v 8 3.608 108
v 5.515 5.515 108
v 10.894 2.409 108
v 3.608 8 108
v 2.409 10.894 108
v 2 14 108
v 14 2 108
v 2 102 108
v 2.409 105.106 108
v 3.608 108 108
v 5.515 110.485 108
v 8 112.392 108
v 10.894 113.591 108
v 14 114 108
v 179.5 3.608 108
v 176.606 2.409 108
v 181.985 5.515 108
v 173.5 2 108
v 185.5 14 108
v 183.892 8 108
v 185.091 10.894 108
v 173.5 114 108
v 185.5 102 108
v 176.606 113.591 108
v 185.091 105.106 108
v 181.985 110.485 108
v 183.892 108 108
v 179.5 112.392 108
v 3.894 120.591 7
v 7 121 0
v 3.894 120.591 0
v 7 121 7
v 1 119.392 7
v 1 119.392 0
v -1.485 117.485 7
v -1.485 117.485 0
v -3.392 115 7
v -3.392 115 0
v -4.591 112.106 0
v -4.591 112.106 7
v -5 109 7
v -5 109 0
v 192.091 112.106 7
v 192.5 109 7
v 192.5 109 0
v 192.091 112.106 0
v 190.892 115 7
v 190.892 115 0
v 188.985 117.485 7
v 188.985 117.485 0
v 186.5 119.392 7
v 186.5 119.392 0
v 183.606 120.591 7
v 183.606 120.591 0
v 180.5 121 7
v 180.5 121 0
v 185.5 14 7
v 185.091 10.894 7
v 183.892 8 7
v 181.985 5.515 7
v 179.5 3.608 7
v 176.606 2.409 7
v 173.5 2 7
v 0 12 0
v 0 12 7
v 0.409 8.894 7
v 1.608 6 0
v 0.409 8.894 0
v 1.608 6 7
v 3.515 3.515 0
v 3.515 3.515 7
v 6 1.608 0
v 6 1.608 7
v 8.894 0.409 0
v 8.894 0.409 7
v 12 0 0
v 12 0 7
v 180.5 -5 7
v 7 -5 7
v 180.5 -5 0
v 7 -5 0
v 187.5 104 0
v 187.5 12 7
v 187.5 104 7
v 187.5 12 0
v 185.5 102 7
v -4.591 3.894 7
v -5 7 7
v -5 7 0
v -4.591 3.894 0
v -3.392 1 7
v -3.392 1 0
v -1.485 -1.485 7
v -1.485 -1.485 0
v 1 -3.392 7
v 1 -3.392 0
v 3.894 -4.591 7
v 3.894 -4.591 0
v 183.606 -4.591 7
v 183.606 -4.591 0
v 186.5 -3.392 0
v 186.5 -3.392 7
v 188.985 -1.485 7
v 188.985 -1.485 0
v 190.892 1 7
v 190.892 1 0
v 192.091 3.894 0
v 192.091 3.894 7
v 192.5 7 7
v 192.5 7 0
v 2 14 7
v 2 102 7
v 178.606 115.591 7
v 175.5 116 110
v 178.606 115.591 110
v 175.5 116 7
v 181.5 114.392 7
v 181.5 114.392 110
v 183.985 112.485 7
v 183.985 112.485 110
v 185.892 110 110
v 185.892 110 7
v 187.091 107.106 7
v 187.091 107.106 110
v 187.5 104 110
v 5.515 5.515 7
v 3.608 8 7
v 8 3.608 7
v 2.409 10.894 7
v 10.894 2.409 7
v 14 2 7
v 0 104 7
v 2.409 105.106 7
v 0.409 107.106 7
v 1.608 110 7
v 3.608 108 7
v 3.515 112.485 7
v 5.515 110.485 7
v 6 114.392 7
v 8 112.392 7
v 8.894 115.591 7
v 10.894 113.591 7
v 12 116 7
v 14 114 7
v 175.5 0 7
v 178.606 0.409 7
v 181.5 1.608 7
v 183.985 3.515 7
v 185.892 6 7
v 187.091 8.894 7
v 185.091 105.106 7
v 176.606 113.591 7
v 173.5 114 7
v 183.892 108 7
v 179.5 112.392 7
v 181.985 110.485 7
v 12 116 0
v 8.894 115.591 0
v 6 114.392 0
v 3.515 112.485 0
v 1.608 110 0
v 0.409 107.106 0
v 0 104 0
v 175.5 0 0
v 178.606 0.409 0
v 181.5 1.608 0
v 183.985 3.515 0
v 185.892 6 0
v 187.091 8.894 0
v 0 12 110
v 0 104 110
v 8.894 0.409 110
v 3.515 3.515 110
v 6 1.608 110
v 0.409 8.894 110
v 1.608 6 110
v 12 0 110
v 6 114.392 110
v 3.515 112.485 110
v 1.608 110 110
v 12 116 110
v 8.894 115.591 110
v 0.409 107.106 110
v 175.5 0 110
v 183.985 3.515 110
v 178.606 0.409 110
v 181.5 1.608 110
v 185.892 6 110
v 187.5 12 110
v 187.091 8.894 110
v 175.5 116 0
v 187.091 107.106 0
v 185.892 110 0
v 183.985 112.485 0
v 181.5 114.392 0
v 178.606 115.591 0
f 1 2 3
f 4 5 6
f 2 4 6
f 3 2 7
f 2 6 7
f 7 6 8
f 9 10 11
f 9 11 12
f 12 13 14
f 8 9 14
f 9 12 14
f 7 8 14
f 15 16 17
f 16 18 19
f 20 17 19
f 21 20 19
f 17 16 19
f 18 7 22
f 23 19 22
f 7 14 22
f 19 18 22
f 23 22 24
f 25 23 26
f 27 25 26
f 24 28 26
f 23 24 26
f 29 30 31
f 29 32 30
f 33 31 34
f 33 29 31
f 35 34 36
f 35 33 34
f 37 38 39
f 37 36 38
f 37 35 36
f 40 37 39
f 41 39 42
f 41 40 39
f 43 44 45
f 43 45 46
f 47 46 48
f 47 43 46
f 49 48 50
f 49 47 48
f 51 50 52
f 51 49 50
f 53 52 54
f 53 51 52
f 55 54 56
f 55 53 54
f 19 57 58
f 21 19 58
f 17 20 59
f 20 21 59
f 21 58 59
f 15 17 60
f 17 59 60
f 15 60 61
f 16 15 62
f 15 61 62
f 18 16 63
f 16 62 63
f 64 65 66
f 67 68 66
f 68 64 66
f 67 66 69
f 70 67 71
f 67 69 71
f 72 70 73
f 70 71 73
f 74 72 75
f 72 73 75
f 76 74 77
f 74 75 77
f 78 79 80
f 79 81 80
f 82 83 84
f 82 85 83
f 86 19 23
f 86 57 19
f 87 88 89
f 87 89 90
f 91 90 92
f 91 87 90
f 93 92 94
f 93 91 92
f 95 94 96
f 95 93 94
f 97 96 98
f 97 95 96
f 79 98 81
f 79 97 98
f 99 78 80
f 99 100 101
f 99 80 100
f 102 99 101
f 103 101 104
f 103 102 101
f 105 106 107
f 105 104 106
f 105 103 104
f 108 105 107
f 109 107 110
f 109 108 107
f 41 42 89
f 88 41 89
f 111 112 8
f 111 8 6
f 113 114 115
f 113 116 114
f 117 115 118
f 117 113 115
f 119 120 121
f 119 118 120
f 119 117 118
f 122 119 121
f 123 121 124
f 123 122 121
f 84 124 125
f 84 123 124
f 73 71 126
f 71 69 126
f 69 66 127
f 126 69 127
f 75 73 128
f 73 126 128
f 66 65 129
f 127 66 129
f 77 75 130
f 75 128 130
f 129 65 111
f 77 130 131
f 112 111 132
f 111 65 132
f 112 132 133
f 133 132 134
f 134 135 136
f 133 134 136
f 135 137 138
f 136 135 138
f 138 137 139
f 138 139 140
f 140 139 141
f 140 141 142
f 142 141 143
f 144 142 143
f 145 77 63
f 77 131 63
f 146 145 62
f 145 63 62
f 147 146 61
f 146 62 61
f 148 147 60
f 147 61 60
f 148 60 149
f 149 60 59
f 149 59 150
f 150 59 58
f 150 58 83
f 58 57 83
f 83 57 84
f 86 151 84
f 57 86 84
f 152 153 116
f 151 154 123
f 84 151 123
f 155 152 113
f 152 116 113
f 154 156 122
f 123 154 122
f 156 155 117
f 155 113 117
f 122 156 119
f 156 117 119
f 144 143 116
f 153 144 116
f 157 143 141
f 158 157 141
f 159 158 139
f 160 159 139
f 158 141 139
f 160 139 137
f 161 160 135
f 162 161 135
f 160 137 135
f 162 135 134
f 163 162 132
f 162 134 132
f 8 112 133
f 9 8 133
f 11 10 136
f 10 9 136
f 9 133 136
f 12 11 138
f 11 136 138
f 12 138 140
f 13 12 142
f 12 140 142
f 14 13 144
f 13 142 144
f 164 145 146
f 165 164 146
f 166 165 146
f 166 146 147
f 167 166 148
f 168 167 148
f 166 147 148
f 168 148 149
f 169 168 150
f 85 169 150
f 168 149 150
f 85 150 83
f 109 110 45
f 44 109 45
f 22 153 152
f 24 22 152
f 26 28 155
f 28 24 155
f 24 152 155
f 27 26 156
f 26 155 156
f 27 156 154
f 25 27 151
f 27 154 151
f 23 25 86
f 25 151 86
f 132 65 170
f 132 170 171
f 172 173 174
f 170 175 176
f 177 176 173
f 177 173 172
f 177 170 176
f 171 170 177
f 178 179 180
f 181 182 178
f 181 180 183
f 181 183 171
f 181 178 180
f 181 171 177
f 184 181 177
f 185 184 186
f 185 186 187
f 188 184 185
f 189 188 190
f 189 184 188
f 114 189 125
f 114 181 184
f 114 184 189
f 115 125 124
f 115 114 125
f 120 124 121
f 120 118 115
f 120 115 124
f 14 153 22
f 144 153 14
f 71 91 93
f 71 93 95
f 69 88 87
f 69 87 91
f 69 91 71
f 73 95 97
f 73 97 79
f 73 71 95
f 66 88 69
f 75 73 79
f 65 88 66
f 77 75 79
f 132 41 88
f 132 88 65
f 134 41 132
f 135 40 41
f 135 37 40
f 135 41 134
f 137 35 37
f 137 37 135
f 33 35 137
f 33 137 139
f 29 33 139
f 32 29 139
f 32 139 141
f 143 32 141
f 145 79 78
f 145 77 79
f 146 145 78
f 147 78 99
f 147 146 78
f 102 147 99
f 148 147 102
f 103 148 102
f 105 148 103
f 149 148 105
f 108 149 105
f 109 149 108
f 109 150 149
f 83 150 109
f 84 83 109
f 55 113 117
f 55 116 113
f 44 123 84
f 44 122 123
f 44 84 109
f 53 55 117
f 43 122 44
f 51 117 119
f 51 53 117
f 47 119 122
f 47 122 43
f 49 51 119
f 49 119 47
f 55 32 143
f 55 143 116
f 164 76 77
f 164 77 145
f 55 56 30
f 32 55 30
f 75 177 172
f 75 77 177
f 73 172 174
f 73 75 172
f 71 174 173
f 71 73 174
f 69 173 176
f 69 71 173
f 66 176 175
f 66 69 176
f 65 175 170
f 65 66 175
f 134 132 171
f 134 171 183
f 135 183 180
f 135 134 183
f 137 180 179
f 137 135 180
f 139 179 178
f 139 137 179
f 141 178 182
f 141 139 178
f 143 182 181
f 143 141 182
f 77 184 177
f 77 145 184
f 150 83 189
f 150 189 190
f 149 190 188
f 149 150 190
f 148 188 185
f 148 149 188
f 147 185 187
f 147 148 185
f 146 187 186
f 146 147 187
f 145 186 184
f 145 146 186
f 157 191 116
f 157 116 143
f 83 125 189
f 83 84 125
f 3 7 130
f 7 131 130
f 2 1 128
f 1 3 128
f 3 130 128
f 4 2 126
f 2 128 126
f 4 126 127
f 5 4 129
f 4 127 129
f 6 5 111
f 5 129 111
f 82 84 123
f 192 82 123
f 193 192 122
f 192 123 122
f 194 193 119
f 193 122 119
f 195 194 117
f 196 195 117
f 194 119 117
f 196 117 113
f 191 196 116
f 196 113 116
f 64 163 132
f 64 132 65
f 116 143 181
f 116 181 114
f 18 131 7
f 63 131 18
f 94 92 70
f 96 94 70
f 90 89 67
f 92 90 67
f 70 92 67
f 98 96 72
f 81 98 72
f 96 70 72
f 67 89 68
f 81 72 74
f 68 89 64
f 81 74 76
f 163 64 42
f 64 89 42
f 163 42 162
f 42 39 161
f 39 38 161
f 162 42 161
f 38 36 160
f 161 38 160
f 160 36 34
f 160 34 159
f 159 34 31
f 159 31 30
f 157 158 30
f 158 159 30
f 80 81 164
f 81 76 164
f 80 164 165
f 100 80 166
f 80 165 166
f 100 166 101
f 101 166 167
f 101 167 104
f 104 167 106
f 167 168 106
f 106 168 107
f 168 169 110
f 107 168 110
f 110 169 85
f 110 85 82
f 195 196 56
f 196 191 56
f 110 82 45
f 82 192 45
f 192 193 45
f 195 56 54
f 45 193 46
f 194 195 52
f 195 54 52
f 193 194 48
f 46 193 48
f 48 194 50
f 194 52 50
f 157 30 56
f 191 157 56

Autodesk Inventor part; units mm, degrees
ref_plane "YZ Plane" through (0, 0, 0) normal (1, 0, 0) x (0, 1, 0)
ref_plane "XZ Plane" through (0, 0, 0) normal (0, 1, 0) x (-1, 0, 0)
ref_plane "XY Plane" through (0, 0, 0) normal (0, 0, 1) x (1, 0, 0)
sketch "Sketch1" plane through (0, 0, 0) normal (0, 0, 1) x (1, 0, 0)
  line L0 (0, 0) -> (187.5, 0)
  line L1 (187.5, 0) -> (187.5, 116)
  line L2 (187.5, 116) -> (0, 116)
  line L3 (0, 116) -> (0, 0)
  line L4 (-5, -5) -> (192.5, -5)
  line L5 (192.5, -5) -> (192.5, 121)
  line L6 (192.5, 121) -> (-5, 121)
  line L7 (-5, 121) -> (-5, -5)
  dimension "d0" = 116
  dimension "d1" = 187.5
  dimension "d2" = 5
  dimension "d3" = 5
  dimension "d4" = 5
  dimension "d5" = 5
extrude "Extrusion1" add sketch "Sketch1" along normal blind 7
fillet "Fillet1" radius 12 8 edges at (-5, -5, 3.5) (-5, 121, 3.5) (192.5, 121, 3.5) (192.5, -5, 3.5) (0, 0, 3.5) (187.5, 116, 3.5) (0, 116, 3.5) (187.5, 0, 3.5)
sketch "Sketch2" plane through (0, 0, 7) normal (0, 0, 1) x (1, 0, 0)
  line L0 (0, 12) -> (0, 104) projected
  arc A0 (12, 116) -> (0, 104) centre (12, 104) ccw projected
  arc A1 (0, 12) -> (12, 0) centre (12, 12) ccw projected
  line L1 (175.5, 0) -> (12, 0) projected
  line L2 (12, 116) -> (175.5, 116) projected
  arc A2 (187.5, 104) -> (175.5, 116) centre (175.5, 104) ccw projected
  line L3 (187.5, 104) -> (187.5, 12) projected
  arc A3 (175.5, 0) -> (187.5, 12) centre (175.5, 12) ccw projected
  line L4 (14, 2) -> (173.5, 2)
  line L5 (185.5, 14) -> (185.5, 102)
  line L6 (173.5, 114) -> (14, 114)
  line L7 (2, 102) -> (2, 14)
  arc A4 (2, 14) -> (14, 2) centre (14, 14) ccw
  arc A5 (14, 114) -> (2, 102) centre (14, 102) ccw
  arc A6 (185.5, 102) -> (173.5, 114) centre (173.5, 102) ccw
  arc A7 (173.5, 2) -> (185.5, 14) centre (173.5, 14) ccw
  point P0 (0, 0)
  dimension "d9" = 2
  dimension "d10" = 2
  dimension "d11" = 2
  dimension "d12" = 2
  dimension "d13" = 12
extrude "Extrusion2" add sketch "Sketch2" along normal blind 103
sketch "Sketch3" plane through (0, 0, 110) normal (0, 0, 1) x (1, 0, 0)
  arc A0 (2, 14) -> (14, 2) centre (14, 14) ccw projected
  line L0 (2, 14) -> (2, 102) projected
  line L1 (173.5, 2) -> (14, 2) projected
  arc A1 (14, 114) -> (2, 102) centre (14, 102) ccw projected
  line L2 (14, 114) -> (173.5, 114) projected
  arc A2 (185.5, 102) -> (173.5, 114) centre (173.5, 102) ccw projected
  line L3 (185.5, 102) -> (185.5, 14) projected
  arc A3 (173.5, 2) -> (185.5, 14) centre (173.5, 14) ccw projected
  point P0 (0, 0)
extrude "Extrusion3" add sketch "Sketch3" against normal blind 2
properties part number "cuva" material "Polycarbonate, Smoke"
